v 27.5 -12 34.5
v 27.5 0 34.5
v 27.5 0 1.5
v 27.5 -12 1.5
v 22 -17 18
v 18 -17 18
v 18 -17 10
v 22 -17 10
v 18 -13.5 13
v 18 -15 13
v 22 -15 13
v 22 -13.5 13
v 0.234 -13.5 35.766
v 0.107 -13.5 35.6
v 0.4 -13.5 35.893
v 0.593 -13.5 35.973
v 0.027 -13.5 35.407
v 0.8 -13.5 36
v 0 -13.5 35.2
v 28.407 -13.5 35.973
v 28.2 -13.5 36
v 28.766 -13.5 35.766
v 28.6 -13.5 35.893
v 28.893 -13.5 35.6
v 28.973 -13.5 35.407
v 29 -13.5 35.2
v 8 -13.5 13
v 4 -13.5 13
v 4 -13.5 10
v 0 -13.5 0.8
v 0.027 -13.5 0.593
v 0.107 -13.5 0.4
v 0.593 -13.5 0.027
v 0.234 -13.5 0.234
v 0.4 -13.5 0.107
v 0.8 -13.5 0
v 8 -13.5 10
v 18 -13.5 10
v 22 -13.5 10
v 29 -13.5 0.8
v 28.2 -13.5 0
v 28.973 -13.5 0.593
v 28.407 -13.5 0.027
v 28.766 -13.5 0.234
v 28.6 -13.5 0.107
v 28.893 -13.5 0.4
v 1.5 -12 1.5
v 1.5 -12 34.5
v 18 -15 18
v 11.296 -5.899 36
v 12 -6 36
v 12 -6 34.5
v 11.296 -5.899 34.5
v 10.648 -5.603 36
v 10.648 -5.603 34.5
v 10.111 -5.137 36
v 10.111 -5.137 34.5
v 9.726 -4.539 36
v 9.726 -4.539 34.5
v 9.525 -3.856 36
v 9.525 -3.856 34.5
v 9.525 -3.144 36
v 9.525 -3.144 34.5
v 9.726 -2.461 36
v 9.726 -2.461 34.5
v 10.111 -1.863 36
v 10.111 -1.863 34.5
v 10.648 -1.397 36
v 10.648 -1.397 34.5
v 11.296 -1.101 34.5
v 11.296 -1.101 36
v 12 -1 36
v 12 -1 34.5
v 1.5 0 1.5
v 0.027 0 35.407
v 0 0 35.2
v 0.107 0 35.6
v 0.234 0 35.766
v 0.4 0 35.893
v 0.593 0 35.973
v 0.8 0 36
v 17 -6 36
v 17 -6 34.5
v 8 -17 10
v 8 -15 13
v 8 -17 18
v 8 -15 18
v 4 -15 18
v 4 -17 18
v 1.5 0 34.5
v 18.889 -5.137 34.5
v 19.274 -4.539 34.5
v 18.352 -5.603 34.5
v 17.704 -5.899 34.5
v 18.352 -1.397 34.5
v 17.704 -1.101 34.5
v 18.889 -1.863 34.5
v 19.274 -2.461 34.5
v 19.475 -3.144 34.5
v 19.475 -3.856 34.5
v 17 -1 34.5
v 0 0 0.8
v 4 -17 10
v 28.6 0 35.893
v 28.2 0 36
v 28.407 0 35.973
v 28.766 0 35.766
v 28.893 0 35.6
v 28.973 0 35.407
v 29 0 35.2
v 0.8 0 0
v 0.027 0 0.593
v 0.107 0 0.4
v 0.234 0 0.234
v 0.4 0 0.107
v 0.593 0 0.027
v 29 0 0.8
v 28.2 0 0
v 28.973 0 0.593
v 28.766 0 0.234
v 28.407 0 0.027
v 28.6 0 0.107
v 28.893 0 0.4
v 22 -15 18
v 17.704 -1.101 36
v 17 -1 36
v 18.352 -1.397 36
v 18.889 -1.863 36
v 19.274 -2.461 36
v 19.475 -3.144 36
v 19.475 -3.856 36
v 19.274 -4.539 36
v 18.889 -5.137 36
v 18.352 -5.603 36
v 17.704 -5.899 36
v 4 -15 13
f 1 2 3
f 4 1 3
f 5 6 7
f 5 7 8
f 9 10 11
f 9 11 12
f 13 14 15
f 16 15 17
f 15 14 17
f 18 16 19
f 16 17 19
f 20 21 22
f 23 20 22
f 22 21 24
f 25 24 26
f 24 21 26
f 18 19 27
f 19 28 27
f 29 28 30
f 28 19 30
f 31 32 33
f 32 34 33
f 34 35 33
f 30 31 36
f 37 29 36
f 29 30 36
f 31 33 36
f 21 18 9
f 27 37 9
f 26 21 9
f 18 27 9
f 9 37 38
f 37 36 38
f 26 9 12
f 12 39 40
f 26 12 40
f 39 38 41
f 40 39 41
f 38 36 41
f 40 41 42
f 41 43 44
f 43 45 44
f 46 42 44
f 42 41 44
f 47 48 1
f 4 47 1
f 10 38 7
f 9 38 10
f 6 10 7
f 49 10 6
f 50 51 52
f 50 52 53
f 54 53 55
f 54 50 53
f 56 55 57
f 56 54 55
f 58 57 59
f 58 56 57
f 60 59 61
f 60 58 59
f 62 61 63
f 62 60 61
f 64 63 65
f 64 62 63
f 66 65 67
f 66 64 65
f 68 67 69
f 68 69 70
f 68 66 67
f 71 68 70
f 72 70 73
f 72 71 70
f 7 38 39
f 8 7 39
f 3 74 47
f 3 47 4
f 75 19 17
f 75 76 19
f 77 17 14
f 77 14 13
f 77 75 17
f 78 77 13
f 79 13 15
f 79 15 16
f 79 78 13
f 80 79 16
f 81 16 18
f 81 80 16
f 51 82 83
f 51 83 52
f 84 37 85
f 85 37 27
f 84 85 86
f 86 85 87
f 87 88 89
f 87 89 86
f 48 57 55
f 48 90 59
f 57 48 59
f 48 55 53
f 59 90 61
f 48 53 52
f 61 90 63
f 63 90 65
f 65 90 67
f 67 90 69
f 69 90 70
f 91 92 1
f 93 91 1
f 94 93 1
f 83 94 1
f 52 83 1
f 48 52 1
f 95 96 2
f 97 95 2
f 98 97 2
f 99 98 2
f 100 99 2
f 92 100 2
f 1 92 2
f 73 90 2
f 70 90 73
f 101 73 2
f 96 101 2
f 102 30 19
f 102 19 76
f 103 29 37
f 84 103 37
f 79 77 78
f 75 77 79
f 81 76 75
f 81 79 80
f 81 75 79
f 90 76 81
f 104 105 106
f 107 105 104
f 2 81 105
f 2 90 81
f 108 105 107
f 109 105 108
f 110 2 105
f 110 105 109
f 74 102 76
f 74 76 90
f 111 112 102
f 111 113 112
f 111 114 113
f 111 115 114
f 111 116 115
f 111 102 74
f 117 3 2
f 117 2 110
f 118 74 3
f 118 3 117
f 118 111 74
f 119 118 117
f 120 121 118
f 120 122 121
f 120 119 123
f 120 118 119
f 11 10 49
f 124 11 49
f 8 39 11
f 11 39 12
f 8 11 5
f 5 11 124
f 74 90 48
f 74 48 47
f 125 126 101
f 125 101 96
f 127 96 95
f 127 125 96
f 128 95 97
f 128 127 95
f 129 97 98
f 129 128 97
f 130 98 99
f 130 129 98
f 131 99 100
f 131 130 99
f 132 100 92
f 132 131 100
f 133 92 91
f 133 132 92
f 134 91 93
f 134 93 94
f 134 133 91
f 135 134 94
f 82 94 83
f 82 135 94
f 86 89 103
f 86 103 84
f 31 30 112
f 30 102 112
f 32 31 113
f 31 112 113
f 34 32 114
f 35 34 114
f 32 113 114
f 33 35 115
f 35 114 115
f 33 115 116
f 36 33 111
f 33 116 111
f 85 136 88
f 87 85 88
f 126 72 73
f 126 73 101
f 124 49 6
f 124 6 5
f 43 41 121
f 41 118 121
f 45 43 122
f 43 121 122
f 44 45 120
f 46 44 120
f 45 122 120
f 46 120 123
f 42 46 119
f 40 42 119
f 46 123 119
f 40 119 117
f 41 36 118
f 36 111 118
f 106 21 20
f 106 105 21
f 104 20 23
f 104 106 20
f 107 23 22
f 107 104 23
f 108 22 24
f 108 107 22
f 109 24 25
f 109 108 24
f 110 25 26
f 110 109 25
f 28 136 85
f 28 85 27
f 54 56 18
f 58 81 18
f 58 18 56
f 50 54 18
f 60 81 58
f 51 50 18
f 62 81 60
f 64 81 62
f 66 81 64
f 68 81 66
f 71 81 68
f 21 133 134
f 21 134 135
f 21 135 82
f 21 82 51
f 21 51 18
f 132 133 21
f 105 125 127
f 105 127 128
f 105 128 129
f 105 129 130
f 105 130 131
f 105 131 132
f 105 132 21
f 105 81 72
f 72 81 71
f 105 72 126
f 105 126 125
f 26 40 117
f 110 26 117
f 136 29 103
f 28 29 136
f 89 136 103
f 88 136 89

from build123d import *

# Parameters (mm, degrees)
SKETCH1_W           = 29
SKETCH1_H           = 13.5
BOSS_EXTRUDE1_DEPTH = 36
SKETCH2_W           = 26
SKETCH2_H           = 33
CUT_EXTRUDE1_DEPTH  = 12
CUT_EXTRUDE2_DEPTH  = 1.5
FILLET1_R           = 0.8
SKETCH5_W           = 4
SKETCH5_H           = 8
BOSS_EXTRUDE2_DEPTH = 3.5
CUT_EXTRUDE3_REACH  = 49.011
SKETCH6_W           = 5
SKETCH6_H           = 1.5


with BuildPart() as part:
    # Sketch1 → Boss-Extrude1 (new body)
    with BuildSketch(Plane.XY):
        with Locations((14.5, -6.75)):
            Rectangle(SKETCH1_W, SKETCH1_H)
    extrude(amount=BOSS_EXTRUDE1_DEPTH)

    # Sketch2 → Cut-Extrude1 (cut)
    with BuildSketch(Plane(origin=(0, 0, 0), x_dir=(1, 0, 0), z_dir=(0, 1, 0))):
        with Locations((14.5, -18)):
            Rectangle(SKETCH2_W, SKETCH2_H)
    extrude(amount=-CUT_EXTRUDE1_DEPTH, mode=Mode.SUBTRACT)

    # Sketch3 → Cut-Extrude2 (cut)
    with BuildSketch(Plane.XY.offset(36)):
        with BuildLine():
            Line((12, -1), (17, -1))
            ThreePointArc((17, -1), (19.5, -3.5), (17, -6))
            Line((17, -6), (12, -6))
            ThreePointArc((12, -6), (9.5, -3.5), (12, -1))
        make_face()
    extrude(amount=-CUT_EXTRUDE2_DEPTH, mode=Mode.SUBTRACT)

    # Fillet1
    fillet1_edges = [part.edges().sort_by_distance(p)[0] for p in [
        (29, -6.75, 36),
        (0, -6.75, 36),
        (29, -6.75, 0),
        (0, -6.75, 0),
    ]]
    fillet(fillet1_edges, radius=FILLET1_R)

    # Sketch5 → Boss-Extrude2 (add)
    with BuildSketch(Plane.XZ.offset(13.5)):
        with Locations((20, 14)):
            Rectangle(SKETCH5_W, SKETCH5_H)
        with Locations((6, 14)):
            Rectangle(SKETCH5_W, SKETCH5_H)
    extrude(amount=BOSS_EXTRUDE2_DEPTH)

    # Cut-Extrude3: up to this face of the body (flat: up to its plane)
    cut_extrude3_end = Plane(part.part.faces().sort_by_distance((22, -15.25, 14))[0])
    # Sketch6 → Cut-Extrude3 (cut, up to the picked face)
    with BuildSketch(Plane.ZY.offset(-4), mode=Mode.PRIVATE) as cut_extrude3_sk1:
        with Locations((15.5, -14.25)):
            Rectangle(SKETCH6_W, SKETCH6_H)
    cut_extrude3_tool1 = split(extrude(cut_extrude3_sk1.sketch, amount=-CUT_EXTRUDE3_REACH, mode=Mode.PRIVATE), bisect_by=cut_extrude3_end, keep=Keep.BOTH, mode=Mode.PRIVATE)
    add(cut_extrude3_tool1.solids().sort_by(Axis((4, -14.25, 15.5), (1, 0, 0)))[0], mode=Mode.SUBTRACT)


solid = part.part
